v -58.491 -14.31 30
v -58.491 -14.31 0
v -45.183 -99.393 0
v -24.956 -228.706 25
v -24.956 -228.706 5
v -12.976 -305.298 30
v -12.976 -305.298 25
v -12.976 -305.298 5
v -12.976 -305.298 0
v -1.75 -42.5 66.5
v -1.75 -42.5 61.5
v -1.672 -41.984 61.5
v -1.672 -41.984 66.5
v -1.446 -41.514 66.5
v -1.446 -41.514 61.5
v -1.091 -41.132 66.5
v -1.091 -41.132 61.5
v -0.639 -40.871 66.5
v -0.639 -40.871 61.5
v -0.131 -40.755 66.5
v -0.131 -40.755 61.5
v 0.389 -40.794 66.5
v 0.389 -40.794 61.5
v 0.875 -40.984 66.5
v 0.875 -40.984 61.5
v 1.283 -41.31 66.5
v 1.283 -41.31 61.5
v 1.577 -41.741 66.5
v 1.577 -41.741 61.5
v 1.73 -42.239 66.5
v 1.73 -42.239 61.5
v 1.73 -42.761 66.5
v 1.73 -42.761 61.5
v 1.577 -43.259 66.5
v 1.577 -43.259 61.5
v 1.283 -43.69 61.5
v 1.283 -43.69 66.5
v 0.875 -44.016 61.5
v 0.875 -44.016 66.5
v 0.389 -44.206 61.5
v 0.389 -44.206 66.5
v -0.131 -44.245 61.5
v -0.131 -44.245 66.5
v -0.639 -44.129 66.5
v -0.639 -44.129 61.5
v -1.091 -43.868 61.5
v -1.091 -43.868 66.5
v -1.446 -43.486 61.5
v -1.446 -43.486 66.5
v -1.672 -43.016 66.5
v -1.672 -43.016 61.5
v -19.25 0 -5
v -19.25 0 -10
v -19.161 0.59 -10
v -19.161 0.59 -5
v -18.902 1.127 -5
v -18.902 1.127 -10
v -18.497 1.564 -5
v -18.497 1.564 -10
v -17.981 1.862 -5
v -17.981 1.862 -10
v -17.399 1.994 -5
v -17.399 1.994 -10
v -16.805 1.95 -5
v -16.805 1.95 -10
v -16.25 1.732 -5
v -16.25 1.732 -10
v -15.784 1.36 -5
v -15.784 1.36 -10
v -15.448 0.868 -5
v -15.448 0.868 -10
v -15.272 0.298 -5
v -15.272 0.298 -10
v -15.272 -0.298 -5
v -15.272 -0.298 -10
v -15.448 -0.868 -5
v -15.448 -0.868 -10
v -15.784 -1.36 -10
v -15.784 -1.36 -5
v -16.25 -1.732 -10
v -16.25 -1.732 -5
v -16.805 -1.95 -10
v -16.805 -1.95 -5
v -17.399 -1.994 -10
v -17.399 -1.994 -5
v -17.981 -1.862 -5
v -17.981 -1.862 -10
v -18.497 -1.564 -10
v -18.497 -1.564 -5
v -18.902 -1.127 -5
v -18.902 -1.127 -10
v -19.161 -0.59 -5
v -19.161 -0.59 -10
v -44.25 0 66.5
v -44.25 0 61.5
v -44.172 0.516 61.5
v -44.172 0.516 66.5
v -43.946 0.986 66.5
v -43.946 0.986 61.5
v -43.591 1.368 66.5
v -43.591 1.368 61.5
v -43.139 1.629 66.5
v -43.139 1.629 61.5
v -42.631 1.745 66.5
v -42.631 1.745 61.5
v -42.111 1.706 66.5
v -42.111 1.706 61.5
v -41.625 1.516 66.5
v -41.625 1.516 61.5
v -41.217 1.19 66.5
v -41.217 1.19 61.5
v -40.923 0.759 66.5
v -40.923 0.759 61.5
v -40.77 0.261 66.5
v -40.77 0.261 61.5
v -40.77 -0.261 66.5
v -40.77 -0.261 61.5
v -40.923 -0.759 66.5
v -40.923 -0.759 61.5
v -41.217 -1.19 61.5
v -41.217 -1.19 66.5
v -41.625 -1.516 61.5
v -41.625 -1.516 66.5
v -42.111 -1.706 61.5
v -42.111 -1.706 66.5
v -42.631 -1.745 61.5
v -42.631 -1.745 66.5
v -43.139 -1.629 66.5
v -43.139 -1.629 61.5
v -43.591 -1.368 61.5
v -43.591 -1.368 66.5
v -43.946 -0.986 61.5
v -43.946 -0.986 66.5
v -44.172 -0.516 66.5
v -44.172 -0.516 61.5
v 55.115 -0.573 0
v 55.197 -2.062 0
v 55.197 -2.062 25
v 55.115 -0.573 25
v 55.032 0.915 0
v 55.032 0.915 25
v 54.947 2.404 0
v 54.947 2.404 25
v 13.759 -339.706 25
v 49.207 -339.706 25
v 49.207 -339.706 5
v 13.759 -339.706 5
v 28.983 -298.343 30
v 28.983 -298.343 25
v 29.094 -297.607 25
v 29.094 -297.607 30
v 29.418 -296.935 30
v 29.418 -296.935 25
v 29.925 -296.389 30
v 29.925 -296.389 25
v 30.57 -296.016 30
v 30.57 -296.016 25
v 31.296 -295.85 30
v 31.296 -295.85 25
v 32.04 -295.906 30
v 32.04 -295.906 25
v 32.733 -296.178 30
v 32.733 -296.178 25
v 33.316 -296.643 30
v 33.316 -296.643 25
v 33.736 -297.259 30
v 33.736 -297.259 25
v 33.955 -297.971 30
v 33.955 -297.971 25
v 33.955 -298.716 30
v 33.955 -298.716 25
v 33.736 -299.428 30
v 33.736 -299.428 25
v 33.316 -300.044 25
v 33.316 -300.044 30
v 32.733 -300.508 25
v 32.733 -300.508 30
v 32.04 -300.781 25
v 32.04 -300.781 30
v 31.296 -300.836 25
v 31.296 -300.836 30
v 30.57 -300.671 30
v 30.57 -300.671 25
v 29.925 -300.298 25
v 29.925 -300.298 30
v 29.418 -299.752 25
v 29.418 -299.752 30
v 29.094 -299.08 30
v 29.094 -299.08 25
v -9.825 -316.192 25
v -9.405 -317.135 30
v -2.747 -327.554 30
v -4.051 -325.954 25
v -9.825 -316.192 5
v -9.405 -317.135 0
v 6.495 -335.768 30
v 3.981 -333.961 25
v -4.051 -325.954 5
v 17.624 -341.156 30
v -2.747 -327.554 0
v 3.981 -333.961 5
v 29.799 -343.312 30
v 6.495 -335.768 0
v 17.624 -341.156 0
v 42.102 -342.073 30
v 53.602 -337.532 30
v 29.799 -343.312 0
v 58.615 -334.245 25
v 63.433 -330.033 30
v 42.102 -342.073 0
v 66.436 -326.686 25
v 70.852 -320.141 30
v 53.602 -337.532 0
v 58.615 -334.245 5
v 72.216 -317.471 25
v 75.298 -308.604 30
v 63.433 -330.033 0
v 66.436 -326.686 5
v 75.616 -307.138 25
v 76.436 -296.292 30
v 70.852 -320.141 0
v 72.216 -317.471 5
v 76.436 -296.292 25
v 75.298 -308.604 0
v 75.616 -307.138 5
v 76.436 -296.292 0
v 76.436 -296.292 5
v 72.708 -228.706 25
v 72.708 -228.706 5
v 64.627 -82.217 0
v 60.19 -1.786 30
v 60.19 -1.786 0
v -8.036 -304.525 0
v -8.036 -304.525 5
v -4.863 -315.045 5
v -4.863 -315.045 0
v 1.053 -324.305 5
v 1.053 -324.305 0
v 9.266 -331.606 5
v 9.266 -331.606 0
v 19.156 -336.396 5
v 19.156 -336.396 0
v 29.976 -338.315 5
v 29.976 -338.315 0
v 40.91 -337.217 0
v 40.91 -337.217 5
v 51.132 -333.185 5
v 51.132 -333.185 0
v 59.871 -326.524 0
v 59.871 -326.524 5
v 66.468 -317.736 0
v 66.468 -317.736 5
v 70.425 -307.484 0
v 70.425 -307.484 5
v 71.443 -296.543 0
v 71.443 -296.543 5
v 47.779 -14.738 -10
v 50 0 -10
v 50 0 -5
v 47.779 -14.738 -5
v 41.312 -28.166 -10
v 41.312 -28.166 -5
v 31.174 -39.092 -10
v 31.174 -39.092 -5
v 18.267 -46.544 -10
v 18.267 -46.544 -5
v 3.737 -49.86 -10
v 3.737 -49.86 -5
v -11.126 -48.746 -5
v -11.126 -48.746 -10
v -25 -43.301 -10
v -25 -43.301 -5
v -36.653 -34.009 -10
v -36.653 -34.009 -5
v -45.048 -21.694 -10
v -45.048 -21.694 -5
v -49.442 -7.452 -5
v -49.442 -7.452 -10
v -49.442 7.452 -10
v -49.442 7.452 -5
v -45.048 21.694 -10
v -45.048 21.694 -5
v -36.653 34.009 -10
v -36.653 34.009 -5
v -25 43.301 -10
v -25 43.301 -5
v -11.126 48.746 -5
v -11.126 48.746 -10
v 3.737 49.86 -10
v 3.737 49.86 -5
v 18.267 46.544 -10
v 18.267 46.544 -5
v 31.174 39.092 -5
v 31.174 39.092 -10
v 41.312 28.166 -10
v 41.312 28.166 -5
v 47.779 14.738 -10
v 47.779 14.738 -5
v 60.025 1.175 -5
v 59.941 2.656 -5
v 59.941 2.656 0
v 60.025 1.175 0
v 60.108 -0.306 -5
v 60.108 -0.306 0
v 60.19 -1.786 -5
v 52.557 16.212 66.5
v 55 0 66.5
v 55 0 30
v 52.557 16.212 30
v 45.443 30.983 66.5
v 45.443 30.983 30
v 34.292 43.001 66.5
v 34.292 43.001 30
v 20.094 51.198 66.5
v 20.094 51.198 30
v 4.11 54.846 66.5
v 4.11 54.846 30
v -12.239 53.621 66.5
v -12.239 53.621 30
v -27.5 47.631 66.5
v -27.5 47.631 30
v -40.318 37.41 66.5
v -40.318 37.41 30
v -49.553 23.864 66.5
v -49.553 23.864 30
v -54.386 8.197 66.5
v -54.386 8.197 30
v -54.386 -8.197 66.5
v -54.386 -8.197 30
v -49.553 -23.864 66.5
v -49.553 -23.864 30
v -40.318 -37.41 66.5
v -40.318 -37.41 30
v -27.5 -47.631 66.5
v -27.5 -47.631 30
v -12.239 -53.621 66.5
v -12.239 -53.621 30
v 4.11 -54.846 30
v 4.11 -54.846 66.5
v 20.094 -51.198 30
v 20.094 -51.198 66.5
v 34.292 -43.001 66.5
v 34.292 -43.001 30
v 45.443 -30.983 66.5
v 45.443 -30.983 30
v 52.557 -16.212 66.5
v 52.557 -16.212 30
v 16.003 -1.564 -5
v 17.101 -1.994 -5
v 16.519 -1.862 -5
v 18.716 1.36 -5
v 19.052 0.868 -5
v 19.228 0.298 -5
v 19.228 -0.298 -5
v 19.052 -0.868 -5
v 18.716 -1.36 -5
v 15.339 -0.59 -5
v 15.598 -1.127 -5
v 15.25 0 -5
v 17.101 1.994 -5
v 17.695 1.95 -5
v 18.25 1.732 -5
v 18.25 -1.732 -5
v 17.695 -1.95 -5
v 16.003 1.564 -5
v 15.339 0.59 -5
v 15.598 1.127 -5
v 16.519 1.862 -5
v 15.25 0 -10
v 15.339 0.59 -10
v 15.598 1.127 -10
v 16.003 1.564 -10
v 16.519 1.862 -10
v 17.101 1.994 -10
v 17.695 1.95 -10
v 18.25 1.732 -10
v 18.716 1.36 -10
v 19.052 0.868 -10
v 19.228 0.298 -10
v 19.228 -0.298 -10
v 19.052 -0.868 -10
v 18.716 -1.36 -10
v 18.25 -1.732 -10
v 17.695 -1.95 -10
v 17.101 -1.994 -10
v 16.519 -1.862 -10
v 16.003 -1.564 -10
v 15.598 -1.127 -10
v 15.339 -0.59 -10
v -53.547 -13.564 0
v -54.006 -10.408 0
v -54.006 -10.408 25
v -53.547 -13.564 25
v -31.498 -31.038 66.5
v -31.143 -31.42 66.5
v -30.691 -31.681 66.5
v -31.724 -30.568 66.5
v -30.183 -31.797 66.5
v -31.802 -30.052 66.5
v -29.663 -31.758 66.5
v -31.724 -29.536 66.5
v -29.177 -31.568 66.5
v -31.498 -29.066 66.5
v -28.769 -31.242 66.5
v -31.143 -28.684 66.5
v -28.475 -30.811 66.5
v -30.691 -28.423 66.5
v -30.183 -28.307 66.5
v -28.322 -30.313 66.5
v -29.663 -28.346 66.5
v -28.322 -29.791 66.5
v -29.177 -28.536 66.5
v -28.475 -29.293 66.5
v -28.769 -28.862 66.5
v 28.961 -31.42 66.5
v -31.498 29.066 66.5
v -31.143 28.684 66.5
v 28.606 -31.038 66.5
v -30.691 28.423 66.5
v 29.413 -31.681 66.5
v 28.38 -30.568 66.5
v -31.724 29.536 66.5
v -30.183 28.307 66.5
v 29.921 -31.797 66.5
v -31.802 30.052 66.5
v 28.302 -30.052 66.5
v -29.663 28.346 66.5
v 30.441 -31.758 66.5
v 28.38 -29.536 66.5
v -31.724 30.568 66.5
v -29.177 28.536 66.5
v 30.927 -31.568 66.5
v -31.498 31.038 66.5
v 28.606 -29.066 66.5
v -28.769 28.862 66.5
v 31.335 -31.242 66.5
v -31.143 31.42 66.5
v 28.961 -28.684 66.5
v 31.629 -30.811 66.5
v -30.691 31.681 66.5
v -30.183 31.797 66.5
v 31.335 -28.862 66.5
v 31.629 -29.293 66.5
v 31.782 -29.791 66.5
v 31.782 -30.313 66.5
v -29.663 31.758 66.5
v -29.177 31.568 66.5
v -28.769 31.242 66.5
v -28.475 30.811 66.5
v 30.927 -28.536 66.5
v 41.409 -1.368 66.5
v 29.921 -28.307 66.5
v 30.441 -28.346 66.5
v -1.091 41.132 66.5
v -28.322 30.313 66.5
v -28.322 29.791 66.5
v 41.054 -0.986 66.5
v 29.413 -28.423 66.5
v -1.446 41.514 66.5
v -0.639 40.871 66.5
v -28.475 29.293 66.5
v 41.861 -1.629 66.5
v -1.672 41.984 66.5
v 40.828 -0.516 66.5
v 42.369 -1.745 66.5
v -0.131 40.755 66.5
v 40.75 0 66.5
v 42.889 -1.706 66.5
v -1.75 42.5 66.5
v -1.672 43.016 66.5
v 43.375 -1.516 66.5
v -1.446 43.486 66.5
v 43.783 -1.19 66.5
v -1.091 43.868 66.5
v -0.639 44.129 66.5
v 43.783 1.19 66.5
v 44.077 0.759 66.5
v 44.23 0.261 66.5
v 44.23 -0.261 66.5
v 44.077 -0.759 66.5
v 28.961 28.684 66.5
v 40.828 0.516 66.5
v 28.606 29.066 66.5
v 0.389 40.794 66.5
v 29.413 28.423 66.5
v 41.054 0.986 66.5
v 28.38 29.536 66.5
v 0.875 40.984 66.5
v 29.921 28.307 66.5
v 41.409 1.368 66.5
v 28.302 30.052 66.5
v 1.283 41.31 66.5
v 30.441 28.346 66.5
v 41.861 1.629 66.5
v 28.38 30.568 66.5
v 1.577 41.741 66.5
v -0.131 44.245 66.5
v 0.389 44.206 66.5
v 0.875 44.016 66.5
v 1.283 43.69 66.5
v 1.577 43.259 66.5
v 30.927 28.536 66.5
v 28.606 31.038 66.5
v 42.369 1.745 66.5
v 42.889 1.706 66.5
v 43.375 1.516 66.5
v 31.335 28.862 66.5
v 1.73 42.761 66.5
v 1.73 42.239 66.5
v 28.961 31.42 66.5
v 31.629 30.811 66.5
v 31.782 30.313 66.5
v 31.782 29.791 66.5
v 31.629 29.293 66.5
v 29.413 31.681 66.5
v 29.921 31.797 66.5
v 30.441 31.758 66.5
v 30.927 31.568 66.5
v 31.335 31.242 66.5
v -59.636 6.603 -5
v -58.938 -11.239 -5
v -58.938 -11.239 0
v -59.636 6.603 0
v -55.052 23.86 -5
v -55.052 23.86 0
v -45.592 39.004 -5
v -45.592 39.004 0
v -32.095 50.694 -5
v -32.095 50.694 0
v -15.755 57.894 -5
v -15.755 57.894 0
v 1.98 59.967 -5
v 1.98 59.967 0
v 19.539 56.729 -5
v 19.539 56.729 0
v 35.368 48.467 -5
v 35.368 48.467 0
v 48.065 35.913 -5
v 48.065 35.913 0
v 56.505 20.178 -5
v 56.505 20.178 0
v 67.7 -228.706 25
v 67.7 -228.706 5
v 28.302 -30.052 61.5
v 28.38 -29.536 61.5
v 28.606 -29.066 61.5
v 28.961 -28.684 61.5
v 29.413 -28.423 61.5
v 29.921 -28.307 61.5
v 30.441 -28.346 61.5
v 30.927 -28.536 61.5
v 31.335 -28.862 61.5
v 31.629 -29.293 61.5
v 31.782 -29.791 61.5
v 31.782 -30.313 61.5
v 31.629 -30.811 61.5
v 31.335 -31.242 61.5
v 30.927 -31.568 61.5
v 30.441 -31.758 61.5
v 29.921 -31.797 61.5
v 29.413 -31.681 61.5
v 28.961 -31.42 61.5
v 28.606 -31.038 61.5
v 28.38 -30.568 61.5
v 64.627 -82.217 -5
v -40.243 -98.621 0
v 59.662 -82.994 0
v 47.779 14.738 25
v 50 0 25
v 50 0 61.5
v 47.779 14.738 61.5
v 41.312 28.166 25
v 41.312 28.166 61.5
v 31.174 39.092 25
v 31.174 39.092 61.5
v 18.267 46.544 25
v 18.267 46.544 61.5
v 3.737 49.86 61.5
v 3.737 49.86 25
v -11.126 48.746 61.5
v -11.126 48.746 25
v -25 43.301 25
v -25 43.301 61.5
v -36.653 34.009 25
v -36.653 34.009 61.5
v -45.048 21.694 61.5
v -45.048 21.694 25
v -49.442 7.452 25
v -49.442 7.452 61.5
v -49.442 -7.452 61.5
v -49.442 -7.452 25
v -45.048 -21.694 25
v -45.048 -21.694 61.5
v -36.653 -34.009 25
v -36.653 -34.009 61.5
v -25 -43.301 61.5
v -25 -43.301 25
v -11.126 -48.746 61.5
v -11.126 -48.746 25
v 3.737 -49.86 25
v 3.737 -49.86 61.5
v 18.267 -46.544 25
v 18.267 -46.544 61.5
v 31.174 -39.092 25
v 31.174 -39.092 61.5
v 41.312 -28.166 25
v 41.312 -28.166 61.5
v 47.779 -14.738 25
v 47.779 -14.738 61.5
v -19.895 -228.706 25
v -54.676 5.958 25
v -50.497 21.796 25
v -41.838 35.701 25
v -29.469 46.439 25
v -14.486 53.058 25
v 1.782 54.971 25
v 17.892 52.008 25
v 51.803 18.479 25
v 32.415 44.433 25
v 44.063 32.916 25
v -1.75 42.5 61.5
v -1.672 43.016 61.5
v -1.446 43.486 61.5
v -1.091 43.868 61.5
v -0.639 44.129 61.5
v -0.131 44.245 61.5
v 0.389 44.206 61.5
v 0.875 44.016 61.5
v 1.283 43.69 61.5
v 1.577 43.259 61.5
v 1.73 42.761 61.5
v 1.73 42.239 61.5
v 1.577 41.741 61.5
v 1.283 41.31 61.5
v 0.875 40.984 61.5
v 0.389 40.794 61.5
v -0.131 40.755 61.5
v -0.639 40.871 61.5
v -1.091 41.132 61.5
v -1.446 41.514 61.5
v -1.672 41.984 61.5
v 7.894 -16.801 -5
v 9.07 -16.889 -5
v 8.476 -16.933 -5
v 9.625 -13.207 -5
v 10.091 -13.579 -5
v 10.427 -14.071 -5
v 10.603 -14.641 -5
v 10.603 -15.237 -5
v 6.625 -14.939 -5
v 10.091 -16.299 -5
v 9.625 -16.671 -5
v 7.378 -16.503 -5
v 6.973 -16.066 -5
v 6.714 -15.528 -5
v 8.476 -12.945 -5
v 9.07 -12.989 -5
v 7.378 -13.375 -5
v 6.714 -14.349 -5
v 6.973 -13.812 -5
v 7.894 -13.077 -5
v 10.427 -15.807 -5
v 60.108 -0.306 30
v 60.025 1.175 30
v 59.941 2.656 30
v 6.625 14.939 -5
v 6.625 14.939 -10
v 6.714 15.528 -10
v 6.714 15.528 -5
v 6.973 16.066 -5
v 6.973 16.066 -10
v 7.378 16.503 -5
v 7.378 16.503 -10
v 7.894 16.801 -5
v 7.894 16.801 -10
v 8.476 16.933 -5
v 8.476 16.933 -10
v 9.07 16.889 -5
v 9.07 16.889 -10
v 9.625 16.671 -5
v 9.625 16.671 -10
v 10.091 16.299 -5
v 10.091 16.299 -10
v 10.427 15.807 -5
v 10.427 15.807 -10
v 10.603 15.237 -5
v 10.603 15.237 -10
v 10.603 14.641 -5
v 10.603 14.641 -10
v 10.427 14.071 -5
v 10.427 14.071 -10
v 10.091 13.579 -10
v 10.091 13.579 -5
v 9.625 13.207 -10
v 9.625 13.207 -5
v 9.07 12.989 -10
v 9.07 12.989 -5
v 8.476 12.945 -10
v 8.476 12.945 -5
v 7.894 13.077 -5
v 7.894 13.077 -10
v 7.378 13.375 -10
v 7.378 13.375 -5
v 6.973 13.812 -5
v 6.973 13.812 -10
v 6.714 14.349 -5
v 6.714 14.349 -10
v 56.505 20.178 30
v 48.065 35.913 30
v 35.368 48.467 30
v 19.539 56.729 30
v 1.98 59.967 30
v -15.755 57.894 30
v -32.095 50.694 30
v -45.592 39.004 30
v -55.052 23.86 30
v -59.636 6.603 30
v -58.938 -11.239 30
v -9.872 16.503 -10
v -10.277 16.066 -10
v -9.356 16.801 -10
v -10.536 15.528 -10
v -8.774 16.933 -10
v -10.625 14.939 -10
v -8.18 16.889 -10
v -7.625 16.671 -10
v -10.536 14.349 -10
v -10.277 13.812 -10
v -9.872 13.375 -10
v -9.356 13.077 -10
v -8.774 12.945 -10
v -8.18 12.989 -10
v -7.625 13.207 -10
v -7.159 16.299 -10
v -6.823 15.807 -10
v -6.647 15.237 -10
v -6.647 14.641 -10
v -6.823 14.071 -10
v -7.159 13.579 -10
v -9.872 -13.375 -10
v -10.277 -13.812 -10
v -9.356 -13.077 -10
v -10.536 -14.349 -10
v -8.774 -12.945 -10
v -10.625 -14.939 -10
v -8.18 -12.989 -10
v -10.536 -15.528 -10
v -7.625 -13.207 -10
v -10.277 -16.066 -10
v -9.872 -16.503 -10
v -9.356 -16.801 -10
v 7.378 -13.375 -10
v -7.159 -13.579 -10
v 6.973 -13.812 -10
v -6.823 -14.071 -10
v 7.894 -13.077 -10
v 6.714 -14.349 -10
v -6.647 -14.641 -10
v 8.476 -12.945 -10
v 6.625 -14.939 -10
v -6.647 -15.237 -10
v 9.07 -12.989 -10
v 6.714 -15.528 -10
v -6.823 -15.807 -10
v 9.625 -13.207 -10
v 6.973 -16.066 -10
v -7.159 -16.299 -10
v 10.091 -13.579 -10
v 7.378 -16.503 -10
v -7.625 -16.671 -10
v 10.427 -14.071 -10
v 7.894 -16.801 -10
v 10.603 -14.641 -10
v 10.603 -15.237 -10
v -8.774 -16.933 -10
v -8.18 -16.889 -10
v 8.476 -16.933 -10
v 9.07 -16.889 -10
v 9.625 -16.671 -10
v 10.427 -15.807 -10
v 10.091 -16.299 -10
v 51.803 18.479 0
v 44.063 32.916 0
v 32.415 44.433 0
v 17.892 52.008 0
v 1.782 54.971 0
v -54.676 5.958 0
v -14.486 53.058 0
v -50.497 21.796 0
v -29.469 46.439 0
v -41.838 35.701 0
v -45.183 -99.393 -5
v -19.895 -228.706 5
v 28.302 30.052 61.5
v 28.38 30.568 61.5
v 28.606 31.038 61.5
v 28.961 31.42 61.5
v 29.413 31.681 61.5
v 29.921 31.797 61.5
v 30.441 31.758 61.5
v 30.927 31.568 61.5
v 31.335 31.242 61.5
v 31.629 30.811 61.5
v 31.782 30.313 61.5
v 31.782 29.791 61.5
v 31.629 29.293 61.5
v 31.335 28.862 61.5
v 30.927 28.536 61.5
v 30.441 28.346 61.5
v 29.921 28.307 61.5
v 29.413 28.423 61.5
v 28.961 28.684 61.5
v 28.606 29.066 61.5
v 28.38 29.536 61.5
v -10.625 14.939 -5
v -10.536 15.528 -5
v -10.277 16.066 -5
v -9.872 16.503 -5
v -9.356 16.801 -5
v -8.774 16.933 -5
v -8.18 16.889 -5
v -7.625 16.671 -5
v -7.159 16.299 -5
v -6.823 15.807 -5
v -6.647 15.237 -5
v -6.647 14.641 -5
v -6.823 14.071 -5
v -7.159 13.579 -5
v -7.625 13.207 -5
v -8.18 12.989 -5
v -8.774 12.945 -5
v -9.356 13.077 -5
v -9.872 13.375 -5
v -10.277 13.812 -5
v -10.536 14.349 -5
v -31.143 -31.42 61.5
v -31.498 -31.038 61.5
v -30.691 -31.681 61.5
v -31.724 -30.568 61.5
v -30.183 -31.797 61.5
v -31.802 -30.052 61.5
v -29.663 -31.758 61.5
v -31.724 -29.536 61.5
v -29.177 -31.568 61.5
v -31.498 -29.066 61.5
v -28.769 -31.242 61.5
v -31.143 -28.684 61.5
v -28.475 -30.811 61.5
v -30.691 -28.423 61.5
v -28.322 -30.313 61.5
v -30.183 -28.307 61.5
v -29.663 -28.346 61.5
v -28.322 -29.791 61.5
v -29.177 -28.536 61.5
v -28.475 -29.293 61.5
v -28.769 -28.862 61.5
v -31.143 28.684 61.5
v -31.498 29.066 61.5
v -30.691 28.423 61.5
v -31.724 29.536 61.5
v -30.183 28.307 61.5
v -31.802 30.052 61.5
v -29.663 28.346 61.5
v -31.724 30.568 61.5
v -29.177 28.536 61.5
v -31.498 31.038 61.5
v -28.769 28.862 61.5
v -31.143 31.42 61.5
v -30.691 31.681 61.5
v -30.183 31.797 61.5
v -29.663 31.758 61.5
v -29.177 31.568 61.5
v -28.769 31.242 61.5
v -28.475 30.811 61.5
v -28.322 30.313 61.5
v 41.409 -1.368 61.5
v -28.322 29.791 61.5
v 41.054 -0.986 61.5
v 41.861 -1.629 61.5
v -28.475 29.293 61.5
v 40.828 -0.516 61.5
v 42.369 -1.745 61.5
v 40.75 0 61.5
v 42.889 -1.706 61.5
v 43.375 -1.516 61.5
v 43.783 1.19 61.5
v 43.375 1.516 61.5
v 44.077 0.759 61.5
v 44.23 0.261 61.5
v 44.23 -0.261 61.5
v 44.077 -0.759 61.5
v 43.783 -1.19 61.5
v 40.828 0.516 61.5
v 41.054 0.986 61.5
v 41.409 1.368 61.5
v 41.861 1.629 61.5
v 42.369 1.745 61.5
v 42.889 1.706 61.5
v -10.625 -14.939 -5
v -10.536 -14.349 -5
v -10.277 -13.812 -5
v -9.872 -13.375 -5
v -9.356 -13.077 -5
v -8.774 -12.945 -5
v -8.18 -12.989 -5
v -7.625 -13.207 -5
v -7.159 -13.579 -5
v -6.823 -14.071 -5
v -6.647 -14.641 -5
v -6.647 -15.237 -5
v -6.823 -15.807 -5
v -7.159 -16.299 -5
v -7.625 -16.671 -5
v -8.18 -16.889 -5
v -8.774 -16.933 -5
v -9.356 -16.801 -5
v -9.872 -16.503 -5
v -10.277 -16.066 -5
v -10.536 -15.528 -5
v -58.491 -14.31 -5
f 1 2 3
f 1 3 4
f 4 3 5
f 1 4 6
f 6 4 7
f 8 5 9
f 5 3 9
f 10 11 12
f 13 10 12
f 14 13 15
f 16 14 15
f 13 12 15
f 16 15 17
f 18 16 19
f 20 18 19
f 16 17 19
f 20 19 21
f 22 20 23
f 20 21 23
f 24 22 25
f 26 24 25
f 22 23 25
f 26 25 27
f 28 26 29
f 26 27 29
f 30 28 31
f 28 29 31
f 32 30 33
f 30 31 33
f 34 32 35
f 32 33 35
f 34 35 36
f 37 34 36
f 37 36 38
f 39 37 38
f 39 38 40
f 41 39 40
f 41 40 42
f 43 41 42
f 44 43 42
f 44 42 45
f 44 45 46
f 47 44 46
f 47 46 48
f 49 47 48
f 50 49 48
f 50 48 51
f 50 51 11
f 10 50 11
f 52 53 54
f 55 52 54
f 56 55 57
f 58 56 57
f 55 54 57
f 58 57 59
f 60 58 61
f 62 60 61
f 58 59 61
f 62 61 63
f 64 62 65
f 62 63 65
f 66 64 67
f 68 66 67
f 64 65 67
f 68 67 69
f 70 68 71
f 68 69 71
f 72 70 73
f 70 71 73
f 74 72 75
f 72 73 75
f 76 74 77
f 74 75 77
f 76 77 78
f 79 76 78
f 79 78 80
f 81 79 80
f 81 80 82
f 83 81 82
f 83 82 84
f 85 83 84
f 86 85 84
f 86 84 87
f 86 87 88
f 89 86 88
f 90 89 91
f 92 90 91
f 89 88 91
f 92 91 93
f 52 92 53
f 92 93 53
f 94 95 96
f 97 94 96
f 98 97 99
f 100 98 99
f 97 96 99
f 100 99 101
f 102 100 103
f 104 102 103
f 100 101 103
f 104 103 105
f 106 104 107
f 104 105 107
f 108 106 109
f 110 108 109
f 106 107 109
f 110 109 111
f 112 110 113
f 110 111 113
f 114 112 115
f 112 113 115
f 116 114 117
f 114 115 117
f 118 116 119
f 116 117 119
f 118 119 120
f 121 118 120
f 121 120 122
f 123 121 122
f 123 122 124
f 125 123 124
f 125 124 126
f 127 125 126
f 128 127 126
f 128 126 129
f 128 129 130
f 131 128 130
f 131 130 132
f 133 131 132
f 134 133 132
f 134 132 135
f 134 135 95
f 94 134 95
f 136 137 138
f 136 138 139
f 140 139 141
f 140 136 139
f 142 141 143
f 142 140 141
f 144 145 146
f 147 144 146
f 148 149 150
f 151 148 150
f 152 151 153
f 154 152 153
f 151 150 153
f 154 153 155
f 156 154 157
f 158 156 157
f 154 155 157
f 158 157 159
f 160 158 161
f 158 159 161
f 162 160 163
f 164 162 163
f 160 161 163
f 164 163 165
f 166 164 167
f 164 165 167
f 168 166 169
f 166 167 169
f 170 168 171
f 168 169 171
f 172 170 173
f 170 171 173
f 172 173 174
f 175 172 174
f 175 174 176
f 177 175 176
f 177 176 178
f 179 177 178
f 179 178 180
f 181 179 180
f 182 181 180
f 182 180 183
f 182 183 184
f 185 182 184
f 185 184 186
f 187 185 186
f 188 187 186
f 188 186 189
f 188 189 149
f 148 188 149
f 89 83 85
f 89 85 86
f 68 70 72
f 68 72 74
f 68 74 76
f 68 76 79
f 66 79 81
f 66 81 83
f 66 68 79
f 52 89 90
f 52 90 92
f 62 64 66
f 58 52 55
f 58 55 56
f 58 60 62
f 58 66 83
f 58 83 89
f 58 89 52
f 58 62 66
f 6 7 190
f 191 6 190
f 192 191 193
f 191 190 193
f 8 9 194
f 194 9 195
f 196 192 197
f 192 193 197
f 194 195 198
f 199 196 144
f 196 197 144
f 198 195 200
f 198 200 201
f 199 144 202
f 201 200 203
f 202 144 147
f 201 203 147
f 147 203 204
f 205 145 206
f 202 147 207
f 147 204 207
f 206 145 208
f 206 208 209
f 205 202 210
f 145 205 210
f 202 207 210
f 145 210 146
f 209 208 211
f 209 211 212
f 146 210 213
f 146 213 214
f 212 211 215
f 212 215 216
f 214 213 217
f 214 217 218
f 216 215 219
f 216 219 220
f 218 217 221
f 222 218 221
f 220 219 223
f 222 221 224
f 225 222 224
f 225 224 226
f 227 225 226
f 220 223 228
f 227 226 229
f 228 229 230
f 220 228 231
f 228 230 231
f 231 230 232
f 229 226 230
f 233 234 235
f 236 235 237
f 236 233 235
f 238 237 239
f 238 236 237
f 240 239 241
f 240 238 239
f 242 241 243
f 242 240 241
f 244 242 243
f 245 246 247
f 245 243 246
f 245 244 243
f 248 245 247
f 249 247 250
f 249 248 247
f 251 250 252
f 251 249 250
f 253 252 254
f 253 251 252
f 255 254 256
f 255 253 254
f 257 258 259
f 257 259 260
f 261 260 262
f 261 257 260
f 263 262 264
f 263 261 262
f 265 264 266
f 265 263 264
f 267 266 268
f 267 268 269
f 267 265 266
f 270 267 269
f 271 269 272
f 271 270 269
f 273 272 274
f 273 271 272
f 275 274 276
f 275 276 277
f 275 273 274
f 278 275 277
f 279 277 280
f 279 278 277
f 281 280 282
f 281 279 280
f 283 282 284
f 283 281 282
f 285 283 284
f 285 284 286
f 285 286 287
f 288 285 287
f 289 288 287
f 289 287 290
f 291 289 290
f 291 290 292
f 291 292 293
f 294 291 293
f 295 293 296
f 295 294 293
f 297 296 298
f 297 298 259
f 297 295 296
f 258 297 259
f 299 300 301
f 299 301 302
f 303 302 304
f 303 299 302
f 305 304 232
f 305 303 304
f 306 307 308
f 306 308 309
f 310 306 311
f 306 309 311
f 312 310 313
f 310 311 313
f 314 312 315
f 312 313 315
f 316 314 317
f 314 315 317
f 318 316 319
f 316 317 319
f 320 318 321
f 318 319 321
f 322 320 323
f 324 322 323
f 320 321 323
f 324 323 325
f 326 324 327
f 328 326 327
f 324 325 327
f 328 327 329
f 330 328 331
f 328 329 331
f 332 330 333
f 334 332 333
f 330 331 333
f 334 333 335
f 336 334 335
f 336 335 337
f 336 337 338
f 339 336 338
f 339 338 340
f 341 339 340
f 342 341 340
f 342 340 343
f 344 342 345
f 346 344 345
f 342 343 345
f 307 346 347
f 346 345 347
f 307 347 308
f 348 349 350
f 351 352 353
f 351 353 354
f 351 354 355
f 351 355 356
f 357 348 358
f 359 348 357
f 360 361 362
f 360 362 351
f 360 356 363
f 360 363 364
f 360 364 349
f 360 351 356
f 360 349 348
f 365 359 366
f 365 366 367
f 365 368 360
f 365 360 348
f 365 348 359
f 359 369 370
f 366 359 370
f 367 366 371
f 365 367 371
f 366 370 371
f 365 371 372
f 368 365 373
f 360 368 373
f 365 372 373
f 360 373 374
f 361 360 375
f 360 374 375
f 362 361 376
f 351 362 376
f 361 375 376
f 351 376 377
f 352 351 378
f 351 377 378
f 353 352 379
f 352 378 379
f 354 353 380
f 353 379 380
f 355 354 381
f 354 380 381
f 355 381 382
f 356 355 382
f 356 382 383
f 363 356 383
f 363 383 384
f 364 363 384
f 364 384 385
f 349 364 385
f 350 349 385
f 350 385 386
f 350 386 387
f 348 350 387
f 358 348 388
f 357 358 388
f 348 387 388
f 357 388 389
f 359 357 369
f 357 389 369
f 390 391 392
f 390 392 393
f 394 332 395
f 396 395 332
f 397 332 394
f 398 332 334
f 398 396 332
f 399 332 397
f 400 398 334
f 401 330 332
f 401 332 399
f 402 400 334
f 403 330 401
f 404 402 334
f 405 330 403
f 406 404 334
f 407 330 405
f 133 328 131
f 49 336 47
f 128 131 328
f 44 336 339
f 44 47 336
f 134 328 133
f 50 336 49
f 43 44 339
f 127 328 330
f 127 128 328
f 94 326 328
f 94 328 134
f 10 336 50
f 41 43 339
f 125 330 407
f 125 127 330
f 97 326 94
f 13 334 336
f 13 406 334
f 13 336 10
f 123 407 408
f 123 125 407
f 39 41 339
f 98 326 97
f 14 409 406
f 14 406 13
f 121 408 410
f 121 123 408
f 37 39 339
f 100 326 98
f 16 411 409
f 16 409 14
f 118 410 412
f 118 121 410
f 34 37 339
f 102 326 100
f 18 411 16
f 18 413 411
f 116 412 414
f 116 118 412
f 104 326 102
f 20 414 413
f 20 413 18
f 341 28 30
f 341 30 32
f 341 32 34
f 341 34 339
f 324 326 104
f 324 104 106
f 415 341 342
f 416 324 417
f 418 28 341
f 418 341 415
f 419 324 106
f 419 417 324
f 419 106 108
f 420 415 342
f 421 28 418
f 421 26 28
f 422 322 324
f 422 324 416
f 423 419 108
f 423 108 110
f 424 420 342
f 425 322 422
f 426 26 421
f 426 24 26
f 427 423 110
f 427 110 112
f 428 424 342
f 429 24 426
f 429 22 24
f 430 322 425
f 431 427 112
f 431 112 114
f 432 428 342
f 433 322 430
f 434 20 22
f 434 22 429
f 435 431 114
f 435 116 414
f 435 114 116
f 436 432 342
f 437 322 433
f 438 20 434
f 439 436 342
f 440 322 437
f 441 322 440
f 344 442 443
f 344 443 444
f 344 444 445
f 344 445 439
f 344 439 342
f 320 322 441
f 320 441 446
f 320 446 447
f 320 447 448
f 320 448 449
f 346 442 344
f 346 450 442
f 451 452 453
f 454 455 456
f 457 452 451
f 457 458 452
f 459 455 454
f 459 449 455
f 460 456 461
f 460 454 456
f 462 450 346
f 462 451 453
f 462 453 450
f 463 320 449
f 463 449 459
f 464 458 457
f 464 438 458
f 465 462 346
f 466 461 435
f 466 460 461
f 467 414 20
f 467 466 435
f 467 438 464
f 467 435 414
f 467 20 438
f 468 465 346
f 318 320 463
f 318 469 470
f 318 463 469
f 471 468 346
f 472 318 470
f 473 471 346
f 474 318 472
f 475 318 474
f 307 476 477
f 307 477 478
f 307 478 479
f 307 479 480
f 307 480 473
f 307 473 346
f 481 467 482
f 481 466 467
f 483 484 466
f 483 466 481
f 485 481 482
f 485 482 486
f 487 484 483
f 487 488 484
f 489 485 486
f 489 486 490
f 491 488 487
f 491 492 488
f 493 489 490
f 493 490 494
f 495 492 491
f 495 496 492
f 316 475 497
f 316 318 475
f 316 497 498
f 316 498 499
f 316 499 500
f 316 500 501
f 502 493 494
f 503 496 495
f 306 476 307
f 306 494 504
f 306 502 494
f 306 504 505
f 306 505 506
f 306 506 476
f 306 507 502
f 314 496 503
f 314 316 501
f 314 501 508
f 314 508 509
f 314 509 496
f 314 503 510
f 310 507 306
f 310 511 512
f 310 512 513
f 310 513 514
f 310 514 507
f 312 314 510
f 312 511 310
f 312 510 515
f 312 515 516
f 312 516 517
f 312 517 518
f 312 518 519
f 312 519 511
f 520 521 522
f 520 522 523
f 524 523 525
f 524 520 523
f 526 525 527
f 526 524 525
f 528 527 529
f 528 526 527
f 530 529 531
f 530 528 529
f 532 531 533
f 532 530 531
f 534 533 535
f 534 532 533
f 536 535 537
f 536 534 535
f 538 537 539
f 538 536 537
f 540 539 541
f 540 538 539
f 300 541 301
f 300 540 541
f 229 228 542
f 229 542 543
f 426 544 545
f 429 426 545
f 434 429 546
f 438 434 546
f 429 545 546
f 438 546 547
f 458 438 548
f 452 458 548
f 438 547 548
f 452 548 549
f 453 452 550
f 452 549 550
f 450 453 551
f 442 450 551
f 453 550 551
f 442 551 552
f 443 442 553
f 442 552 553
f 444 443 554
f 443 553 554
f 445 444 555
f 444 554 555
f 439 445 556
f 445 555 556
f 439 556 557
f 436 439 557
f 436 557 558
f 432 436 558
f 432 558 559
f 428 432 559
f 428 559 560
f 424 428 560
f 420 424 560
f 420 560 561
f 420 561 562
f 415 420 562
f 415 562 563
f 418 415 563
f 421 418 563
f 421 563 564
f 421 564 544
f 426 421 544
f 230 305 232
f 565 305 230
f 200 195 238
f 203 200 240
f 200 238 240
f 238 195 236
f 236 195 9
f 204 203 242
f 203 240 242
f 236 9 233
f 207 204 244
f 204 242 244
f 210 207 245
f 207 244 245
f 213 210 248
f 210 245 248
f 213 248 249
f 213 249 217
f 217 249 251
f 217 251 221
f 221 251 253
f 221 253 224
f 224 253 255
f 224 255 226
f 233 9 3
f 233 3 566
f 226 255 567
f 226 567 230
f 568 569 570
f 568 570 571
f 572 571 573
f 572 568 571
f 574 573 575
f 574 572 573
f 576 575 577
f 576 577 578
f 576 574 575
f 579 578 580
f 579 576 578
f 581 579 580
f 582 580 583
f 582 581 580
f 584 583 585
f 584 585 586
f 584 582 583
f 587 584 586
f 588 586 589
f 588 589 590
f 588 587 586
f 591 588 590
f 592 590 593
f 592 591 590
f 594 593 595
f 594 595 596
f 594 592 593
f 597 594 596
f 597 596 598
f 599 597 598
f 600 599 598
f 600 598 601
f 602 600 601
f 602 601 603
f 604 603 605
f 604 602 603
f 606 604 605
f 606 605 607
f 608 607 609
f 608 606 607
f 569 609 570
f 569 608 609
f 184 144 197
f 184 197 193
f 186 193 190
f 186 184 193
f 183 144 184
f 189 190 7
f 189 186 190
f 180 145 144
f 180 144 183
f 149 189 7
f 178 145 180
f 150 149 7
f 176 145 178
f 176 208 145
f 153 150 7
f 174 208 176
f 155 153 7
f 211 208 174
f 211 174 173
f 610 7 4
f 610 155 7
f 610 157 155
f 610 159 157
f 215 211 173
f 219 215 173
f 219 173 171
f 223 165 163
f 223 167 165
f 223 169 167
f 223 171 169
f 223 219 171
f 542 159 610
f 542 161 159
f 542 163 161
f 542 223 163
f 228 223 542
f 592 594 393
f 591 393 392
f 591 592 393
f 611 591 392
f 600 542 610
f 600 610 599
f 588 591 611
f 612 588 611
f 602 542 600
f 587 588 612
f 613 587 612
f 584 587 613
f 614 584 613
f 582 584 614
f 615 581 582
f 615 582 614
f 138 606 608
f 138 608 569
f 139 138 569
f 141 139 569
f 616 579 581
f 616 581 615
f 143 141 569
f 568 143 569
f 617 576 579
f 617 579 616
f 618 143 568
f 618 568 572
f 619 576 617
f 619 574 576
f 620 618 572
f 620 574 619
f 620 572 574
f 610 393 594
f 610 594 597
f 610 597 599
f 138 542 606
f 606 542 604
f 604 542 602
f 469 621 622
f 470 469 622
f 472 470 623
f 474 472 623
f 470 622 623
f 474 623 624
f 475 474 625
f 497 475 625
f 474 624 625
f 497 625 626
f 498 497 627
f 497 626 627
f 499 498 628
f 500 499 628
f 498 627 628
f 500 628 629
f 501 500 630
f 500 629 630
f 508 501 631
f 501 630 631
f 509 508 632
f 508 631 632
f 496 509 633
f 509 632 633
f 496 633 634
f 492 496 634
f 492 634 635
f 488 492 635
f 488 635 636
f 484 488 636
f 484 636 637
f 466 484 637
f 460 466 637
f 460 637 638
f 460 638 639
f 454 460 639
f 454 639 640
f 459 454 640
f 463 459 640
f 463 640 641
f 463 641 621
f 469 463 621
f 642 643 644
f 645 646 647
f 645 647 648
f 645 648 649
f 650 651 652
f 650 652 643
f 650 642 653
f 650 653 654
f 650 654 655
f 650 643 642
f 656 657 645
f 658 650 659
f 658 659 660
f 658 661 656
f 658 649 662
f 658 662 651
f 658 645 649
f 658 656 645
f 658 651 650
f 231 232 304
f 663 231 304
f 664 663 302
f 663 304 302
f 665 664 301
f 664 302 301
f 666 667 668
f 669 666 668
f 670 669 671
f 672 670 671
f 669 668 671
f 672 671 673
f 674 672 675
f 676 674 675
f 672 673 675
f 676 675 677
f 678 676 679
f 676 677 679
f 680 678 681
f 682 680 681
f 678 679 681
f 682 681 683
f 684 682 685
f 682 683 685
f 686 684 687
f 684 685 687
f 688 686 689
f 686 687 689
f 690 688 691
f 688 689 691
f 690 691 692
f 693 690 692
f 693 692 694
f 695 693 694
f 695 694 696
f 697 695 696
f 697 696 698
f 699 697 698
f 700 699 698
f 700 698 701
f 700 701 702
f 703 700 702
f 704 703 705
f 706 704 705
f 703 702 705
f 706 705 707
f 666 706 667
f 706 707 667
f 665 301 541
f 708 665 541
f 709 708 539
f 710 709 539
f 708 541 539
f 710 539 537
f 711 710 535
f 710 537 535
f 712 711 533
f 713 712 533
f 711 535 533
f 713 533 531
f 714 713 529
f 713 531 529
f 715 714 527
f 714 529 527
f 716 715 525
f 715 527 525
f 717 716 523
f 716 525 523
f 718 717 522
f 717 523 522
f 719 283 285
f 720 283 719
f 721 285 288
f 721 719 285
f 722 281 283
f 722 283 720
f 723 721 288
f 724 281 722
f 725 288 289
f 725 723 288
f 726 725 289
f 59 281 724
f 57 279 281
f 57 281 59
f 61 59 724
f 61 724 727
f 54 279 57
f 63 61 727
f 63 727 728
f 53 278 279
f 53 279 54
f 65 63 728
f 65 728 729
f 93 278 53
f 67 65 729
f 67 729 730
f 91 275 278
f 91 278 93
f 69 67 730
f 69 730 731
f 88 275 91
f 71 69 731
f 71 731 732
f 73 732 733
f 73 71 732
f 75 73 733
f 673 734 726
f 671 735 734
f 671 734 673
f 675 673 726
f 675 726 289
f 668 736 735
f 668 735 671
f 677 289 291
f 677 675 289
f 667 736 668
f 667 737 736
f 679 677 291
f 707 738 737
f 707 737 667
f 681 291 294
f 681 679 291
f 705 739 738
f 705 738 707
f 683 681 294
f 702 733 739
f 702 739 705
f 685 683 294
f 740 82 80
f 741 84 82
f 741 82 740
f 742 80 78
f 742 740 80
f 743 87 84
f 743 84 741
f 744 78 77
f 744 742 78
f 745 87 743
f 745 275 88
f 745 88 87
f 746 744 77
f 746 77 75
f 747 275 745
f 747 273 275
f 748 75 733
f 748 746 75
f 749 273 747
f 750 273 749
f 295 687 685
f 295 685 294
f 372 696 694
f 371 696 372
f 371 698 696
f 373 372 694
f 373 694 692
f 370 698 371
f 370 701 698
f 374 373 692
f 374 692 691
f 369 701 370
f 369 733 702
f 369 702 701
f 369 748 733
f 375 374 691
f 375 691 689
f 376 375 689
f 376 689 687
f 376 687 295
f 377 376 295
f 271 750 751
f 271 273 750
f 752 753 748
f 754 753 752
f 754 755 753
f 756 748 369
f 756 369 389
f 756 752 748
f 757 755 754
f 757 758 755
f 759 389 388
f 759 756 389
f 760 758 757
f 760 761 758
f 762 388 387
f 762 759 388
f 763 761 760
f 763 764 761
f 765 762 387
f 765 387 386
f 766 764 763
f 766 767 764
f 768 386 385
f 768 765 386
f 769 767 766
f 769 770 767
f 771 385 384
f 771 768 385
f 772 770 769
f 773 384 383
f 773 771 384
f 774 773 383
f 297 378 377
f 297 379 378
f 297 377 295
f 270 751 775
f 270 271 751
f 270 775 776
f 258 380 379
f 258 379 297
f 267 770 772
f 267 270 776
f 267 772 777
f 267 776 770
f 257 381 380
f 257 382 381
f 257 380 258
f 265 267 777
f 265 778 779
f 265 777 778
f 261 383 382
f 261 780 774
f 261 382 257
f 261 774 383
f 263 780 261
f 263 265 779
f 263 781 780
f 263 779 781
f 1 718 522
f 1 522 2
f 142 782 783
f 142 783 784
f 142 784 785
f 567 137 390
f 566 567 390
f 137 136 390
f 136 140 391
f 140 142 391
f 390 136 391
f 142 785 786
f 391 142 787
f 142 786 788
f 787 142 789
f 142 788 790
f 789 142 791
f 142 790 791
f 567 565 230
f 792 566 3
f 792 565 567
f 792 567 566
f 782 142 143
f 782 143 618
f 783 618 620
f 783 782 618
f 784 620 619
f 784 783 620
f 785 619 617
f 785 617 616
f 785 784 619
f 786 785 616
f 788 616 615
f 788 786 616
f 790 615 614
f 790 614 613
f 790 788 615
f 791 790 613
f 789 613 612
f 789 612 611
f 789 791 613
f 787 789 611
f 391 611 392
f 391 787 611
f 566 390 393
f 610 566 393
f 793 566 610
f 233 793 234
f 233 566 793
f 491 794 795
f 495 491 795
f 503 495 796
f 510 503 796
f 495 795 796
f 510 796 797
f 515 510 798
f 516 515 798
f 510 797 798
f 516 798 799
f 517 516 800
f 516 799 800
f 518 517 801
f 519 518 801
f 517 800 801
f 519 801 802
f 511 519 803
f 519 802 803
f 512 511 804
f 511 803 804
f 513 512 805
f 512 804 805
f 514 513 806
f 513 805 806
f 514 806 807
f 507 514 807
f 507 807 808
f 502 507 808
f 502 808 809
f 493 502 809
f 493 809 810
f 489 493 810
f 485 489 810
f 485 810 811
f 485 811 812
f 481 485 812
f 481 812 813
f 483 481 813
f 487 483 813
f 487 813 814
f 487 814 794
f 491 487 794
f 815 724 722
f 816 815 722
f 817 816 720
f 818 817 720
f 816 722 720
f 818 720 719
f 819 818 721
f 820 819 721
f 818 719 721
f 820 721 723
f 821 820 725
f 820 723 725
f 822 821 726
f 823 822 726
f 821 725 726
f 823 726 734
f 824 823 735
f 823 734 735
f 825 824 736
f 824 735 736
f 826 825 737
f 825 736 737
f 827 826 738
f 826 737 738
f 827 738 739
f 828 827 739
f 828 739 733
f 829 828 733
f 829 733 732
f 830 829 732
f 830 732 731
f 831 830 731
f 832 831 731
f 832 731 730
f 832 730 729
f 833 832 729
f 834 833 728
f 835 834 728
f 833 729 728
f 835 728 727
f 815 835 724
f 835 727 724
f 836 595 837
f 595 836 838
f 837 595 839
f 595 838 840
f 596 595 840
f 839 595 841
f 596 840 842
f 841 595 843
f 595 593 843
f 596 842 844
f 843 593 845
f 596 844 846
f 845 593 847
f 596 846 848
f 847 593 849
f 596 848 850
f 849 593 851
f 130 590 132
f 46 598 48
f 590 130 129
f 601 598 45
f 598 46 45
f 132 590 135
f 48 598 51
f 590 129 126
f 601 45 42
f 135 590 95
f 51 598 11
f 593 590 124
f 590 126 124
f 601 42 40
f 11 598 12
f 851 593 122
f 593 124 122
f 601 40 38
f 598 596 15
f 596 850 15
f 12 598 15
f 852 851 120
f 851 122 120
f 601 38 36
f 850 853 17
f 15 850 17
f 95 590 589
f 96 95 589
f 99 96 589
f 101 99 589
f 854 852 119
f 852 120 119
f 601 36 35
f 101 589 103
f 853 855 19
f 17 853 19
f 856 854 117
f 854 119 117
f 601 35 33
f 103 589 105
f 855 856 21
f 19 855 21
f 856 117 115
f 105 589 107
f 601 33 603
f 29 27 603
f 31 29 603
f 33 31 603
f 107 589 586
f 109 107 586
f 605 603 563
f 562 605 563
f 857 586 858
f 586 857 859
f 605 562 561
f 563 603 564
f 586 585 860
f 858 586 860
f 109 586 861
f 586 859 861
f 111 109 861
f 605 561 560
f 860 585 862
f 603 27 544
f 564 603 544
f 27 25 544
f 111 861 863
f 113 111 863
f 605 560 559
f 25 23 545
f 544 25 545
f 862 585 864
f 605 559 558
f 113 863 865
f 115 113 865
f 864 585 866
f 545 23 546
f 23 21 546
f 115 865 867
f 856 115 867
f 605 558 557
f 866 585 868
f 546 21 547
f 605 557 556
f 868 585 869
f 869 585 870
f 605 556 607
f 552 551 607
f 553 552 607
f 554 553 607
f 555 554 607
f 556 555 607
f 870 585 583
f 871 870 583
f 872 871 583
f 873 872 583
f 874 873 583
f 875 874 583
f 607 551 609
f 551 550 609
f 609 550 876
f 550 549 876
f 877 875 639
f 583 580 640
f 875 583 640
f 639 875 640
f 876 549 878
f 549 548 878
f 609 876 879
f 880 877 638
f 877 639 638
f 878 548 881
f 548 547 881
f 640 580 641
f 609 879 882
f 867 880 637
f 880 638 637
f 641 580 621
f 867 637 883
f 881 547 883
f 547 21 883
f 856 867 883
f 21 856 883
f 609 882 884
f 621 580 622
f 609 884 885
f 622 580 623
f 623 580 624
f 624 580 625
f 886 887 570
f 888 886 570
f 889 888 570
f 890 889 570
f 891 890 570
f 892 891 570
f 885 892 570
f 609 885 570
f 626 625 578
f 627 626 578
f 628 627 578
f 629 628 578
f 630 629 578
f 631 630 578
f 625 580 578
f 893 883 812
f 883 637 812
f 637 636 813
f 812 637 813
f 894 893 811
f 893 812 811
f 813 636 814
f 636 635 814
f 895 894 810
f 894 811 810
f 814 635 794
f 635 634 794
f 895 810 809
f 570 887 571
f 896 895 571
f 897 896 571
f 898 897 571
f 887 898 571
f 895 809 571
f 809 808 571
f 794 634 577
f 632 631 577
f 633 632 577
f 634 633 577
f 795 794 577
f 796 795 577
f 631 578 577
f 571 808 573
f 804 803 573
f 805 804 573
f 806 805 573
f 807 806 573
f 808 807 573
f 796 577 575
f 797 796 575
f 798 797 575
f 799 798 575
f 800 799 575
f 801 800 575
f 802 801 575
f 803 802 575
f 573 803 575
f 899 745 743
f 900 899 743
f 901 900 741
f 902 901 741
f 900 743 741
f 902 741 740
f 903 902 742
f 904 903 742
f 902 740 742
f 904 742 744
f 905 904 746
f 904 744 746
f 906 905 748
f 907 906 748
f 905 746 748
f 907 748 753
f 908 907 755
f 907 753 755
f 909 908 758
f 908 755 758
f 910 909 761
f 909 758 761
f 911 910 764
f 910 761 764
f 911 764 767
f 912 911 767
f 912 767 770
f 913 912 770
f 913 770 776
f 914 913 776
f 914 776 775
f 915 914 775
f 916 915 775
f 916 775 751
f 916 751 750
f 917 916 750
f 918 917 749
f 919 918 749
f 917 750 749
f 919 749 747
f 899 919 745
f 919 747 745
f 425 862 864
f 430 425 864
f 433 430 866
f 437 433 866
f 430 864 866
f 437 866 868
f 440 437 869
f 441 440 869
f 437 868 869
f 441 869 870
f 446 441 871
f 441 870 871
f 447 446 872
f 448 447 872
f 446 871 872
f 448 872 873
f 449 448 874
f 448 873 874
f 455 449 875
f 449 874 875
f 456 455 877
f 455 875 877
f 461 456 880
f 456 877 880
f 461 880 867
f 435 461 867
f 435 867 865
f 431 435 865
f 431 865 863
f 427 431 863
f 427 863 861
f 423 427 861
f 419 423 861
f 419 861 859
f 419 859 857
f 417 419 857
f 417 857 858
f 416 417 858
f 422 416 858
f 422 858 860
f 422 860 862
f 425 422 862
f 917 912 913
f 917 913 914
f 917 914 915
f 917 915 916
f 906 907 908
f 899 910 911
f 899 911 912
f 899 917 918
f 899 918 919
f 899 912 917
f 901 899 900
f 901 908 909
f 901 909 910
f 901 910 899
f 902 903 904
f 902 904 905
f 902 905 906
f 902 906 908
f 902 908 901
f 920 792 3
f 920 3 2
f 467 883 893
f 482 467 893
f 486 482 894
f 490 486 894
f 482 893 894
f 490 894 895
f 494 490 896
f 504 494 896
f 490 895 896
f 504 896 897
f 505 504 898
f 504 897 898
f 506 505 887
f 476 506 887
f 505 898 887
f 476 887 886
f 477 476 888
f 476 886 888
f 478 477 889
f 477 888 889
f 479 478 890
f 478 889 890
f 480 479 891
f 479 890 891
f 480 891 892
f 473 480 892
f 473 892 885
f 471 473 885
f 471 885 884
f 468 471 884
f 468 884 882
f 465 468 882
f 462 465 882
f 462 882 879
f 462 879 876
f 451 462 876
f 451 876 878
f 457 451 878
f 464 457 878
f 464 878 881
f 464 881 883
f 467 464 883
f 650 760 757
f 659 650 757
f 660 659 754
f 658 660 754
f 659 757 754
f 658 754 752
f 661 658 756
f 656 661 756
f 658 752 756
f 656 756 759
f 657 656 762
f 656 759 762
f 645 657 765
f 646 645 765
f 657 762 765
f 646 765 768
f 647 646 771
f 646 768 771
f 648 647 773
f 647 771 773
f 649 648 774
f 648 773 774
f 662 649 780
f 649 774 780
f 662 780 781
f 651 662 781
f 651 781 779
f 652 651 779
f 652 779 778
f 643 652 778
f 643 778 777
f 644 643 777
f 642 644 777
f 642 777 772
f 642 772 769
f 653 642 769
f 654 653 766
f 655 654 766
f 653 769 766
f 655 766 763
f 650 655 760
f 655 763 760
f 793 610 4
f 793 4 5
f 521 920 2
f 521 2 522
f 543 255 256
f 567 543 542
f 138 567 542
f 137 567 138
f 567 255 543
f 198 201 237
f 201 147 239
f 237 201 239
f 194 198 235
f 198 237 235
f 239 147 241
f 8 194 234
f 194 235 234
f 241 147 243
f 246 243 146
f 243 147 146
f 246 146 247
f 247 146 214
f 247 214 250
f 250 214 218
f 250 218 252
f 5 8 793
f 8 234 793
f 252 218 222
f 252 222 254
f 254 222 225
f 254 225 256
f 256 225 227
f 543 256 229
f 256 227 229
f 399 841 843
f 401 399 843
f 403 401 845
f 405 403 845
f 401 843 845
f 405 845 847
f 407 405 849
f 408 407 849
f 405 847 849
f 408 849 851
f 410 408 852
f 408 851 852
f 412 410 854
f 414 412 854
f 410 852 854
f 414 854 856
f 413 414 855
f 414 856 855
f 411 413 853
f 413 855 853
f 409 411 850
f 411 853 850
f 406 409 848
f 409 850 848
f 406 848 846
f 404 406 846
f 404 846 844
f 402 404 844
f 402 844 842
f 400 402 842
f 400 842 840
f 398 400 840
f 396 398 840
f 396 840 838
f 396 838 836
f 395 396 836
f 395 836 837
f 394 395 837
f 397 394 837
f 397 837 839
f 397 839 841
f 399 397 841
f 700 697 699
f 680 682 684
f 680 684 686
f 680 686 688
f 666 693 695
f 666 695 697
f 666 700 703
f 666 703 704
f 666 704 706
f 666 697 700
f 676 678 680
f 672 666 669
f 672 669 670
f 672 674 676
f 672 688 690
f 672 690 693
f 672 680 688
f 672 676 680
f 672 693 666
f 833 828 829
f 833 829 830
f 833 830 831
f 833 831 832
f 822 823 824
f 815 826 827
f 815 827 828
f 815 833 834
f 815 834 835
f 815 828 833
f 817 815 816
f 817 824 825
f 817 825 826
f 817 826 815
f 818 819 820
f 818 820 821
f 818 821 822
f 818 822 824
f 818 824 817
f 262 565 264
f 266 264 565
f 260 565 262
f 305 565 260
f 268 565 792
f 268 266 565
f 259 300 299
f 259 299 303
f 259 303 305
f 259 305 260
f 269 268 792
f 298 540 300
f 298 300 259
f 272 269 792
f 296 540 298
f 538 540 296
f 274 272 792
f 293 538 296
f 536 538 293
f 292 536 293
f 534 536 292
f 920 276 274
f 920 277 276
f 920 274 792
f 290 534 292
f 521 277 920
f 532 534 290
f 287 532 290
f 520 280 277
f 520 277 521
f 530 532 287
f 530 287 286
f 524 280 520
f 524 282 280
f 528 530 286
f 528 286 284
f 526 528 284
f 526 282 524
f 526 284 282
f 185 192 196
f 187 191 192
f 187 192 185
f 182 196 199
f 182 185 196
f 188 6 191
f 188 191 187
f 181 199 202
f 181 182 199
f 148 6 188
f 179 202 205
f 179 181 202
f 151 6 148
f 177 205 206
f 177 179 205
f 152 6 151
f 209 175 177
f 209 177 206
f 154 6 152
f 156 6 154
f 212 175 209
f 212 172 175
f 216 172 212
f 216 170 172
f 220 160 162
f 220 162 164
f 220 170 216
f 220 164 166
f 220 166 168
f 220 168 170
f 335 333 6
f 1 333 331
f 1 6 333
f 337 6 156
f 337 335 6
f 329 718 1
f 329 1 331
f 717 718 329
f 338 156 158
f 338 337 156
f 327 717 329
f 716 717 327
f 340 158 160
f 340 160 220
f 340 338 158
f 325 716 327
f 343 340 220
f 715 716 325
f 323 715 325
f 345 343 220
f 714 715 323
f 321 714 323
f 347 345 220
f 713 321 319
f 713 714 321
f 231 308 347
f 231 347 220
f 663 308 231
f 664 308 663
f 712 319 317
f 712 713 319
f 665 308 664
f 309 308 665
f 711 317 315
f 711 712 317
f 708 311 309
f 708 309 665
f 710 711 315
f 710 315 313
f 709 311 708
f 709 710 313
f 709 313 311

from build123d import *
from build123d.topology import SkipClean

# Parameters (mm, degrees)
EXTRUDE_1_DEPTH      = 30
SKETCH_2_R           = 55
EXTRUDE_2_DEPTH      = 36.5
SHELL_4_DEPTH        = 25
SHELL_START          = 25
SHELL_4_2_OUTLINE_R  = 50
SHELL_4_2_DEPTH      = 36.5
SKETCH_3_W           = 20
SKETCH_3_H           = 111
CUT_EXTRUDE_2_DEPTH  = 500
SKETCH_4_R           = 2.5
CUT_EXTRUDE_4_DEPTH  = 355.19861062
SKETCH_5_R           = 1.75
CUT_EXTRUDE_5_DEPTH  = 358.094743401
EXTRUDE_START        = 5
EXTRUDE_3_DEPTH      = 5
SKETCH_12_R          = 50
EXTRUDE_4_DEPTH      = 5
SKETCH_13_R          = 2
CUT_EXTRUDE_10_DEPTH = 5


# Read off the part's stored shape, not the designer's step: 抽壳4
with BuildPart() as part:
    # 草图1 → 凸台-拉伸1 (new body)
    with BuildSketch(Plane.XY):
        with BuildLine():
            Line((-58.937975667, -11.238995696), (-58.491161057, -14.310445119))
            Line((-58.491161057, -14.310445119), (-12.976113652, -305.2975933))
            ThreePointArc((-12.976113652, -305.2975933), (35.99310733, -343.116877228), (76.436495207, -296.291507849))
            Line((76.436495207, -296.291507849), (60.189812793, -1.786392218))
            ThreePointArc((60.189812793, -1.786392218), (60.066392408, 0.434720965), (59.941196791, 2.655734793))
            ThreePointArc((59.941196791, 2.655734793), (-6.965450237, 59.594316029), (-58.937975667, -11.238995696))
        make_face()
    extrude(amount=EXTRUDE_1_DEPTH)

    # 草图2 → 凸台-拉伸2 (add)
    with BuildSketch(Plane.XY.offset(30)):
        Circle(SKETCH_2_R)
    extrude(amount=EXTRUDE_2_DEPTH)

    # 抽壳4 outline → 抽壳4 (cut)
    with BuildSketch(Plane.XY):
        with BuildLine():
            Line((-53.547092666, -13.564185688), (-8.036178628, -304.524908395))
            ThreePointArc((-8.036178628, -304.524908395), (35.480554819, -338.143202606), (71.442739942, -296.542517074))
            Line((71.442739942, -296.542517074), (55.197403703, -2.061803682))
            ThreePointArc((55.197403703, -2.061803682), (55.073318105, 0.171165742), (54.947435043, 2.404034556))
            ThreePointArc((54.947435043, 2.404034556), (-6.423300224, 54.623632379), (-54.006228237, -10.408040718))
            Line((-54.006228237, -10.408040718), (-53.547092666, -13.564185688))
        make_face()
    extrude(amount=SHELL_4_DEPTH, mode=Mode.SUBTRACT)

    # Shell 4 2 outline → Shell 4 2 (cut)
    with BuildSketch(Plane.XY.offset(SHELL_START)):
        Circle(SHELL_4_2_OUTLINE_R)
    extrude(amount=SHELL_4_2_DEPTH, mode=Mode.SUBTRACT)

    # 草图3 → 切除-拉伸2 (cut, symmetric)
    with BuildSketch(Plane(origin=(0, 0, 0), x_dir=(0, 0, -1), z_dir=(1, 0, 0))):
        with Locations((-15, -284.205905552)):
            Rectangle(SKETCH_3_W, SKETCH_3_H)
    extrude(amount=CUT_EXTRUDE_2_DEPTH, both=True, mode=Mode.SUBTRACT)

    # 草图4 → 切除-拉伸4 (cut, through all)
    with BuildSketch(Plane(origin=(0, 0, 25), x_dir=(-1, 0, 0), z_dir=(0, 0, -1))):
        with Locations((-31.483301561, -298.34342916)):
            Circle(SKETCH_4_R)
    extrude(amount=-CUT_EXTRUDE_4_DEPTH, mode=Mode.SUBTRACT)

    # 草图5 → 切除-拉伸5 (cut, through all)
    with BuildSketch(Plane(origin=(0, 0, 61.5), x_dir=(-1, 0, 0), z_dir=(0, 0, -1))):
        with Locations((-42.5, 0)):
            Circle(SKETCH_5_R)
        with Locations((-30.0520382, 30.0520382)):
            Circle(SKETCH_5_R)
        with Locations((0, 42.5)):
            Circle(SKETCH_5_R)
        with Locations((30.0520382, 30.0520382)):
            Circle(SKETCH_5_R)
        with Locations((42.5, 0)):
            Circle(SKETCH_5_R)
        with Locations((30.0520382, -30.0520382)):
            Circle(SKETCH_5_R)
        with Locations((0, -42.5)):
            Circle(SKETCH_5_R)
        with Locations((-30.0520382, -30.0520382)):
            Circle(SKETCH_5_R)
    extrude(amount=-CUT_EXTRUDE_5_DEPTH, mode=Mode.SUBTRACT)

    # 草图11 → 凸台-拉伸3 (add)
    with SkipClean():  # the faces are left unmerged after this step: merging them gives an invalid solid
        with BuildSketch(Plane(origin=(0, 0, 0), x_dir=(-1, 0, 0), z_dir=(0, 0, -1)).offset(EXTRUDE_START)):
            with BuildLine():
                Line((-64.626874789, -82.217425636), (45.182822013, -99.393419788))
                Line((45.182822013, -99.393419788), (58.491161057, -14.310445119))
                Line((58.491161057, -14.310445119), (58.937975667, -11.238995696))
                ThreePointArc((58.937975667, -11.238995696), (6.965450237, 59.594316029), (-59.941196791, 2.655734793))
                ThreePointArc((-59.941196791, 2.655734793), (-60.066392408, 0.434720965), (-60.189812793, -1.786392218))
                Line((-60.189812793, -1.786392218), (-64.626874789, -82.217425636))
            make_face()
        extrude(amount=-EXTRUDE_3_DEPTH)

    # 草图12 → 凸台-拉伸4 (add)
    with SkipClean():  # the faces are left unmerged after this step: merging them gives an invalid solid
        with BuildSketch(Plane(origin=(0, 0, -5), x_dir=(-1, 0, 0), z_dir=(0, 0, -1)).offset(EXTRUDE_START)):
            with Locations(Location((0, 0, 0), (0, 0, 180))):
                Circle(SKETCH_12_R)
        extrude(amount=-EXTRUDE_4_DEPTH)

    # 草图13 → 切除-拉伸10 (cut)
    with SkipClean():  # the faces are left unmerged after this step: merging them gives an invalid solid
        with BuildSketch(Plane(origin=(0, 0, -10), x_dir=(-1, 0, 0), z_dir=(0, 0, -1))):
            with Locations((17.25, 0)):
                Circle(SKETCH_13_R)
            with Locations((8.625, -14.938938215)):
                Circle(SKETCH_13_R)
            with Locations((-8.625, -14.938938215)):
                Circle(SKETCH_13_R)
            with Locations((-17.25, 0)):
                Circle(SKETCH_13_R)
            with Locations((-8.625, 14.938938215)):
                Circle(SKETCH_13_R)
            with Locations((8.625, 14.938938215)):
                Circle(SKETCH_13_R)
        extrude(amount=-CUT_EXTRUDE_10_DEPTH, mode=Mode.SUBTRACT)


solid = part.part
